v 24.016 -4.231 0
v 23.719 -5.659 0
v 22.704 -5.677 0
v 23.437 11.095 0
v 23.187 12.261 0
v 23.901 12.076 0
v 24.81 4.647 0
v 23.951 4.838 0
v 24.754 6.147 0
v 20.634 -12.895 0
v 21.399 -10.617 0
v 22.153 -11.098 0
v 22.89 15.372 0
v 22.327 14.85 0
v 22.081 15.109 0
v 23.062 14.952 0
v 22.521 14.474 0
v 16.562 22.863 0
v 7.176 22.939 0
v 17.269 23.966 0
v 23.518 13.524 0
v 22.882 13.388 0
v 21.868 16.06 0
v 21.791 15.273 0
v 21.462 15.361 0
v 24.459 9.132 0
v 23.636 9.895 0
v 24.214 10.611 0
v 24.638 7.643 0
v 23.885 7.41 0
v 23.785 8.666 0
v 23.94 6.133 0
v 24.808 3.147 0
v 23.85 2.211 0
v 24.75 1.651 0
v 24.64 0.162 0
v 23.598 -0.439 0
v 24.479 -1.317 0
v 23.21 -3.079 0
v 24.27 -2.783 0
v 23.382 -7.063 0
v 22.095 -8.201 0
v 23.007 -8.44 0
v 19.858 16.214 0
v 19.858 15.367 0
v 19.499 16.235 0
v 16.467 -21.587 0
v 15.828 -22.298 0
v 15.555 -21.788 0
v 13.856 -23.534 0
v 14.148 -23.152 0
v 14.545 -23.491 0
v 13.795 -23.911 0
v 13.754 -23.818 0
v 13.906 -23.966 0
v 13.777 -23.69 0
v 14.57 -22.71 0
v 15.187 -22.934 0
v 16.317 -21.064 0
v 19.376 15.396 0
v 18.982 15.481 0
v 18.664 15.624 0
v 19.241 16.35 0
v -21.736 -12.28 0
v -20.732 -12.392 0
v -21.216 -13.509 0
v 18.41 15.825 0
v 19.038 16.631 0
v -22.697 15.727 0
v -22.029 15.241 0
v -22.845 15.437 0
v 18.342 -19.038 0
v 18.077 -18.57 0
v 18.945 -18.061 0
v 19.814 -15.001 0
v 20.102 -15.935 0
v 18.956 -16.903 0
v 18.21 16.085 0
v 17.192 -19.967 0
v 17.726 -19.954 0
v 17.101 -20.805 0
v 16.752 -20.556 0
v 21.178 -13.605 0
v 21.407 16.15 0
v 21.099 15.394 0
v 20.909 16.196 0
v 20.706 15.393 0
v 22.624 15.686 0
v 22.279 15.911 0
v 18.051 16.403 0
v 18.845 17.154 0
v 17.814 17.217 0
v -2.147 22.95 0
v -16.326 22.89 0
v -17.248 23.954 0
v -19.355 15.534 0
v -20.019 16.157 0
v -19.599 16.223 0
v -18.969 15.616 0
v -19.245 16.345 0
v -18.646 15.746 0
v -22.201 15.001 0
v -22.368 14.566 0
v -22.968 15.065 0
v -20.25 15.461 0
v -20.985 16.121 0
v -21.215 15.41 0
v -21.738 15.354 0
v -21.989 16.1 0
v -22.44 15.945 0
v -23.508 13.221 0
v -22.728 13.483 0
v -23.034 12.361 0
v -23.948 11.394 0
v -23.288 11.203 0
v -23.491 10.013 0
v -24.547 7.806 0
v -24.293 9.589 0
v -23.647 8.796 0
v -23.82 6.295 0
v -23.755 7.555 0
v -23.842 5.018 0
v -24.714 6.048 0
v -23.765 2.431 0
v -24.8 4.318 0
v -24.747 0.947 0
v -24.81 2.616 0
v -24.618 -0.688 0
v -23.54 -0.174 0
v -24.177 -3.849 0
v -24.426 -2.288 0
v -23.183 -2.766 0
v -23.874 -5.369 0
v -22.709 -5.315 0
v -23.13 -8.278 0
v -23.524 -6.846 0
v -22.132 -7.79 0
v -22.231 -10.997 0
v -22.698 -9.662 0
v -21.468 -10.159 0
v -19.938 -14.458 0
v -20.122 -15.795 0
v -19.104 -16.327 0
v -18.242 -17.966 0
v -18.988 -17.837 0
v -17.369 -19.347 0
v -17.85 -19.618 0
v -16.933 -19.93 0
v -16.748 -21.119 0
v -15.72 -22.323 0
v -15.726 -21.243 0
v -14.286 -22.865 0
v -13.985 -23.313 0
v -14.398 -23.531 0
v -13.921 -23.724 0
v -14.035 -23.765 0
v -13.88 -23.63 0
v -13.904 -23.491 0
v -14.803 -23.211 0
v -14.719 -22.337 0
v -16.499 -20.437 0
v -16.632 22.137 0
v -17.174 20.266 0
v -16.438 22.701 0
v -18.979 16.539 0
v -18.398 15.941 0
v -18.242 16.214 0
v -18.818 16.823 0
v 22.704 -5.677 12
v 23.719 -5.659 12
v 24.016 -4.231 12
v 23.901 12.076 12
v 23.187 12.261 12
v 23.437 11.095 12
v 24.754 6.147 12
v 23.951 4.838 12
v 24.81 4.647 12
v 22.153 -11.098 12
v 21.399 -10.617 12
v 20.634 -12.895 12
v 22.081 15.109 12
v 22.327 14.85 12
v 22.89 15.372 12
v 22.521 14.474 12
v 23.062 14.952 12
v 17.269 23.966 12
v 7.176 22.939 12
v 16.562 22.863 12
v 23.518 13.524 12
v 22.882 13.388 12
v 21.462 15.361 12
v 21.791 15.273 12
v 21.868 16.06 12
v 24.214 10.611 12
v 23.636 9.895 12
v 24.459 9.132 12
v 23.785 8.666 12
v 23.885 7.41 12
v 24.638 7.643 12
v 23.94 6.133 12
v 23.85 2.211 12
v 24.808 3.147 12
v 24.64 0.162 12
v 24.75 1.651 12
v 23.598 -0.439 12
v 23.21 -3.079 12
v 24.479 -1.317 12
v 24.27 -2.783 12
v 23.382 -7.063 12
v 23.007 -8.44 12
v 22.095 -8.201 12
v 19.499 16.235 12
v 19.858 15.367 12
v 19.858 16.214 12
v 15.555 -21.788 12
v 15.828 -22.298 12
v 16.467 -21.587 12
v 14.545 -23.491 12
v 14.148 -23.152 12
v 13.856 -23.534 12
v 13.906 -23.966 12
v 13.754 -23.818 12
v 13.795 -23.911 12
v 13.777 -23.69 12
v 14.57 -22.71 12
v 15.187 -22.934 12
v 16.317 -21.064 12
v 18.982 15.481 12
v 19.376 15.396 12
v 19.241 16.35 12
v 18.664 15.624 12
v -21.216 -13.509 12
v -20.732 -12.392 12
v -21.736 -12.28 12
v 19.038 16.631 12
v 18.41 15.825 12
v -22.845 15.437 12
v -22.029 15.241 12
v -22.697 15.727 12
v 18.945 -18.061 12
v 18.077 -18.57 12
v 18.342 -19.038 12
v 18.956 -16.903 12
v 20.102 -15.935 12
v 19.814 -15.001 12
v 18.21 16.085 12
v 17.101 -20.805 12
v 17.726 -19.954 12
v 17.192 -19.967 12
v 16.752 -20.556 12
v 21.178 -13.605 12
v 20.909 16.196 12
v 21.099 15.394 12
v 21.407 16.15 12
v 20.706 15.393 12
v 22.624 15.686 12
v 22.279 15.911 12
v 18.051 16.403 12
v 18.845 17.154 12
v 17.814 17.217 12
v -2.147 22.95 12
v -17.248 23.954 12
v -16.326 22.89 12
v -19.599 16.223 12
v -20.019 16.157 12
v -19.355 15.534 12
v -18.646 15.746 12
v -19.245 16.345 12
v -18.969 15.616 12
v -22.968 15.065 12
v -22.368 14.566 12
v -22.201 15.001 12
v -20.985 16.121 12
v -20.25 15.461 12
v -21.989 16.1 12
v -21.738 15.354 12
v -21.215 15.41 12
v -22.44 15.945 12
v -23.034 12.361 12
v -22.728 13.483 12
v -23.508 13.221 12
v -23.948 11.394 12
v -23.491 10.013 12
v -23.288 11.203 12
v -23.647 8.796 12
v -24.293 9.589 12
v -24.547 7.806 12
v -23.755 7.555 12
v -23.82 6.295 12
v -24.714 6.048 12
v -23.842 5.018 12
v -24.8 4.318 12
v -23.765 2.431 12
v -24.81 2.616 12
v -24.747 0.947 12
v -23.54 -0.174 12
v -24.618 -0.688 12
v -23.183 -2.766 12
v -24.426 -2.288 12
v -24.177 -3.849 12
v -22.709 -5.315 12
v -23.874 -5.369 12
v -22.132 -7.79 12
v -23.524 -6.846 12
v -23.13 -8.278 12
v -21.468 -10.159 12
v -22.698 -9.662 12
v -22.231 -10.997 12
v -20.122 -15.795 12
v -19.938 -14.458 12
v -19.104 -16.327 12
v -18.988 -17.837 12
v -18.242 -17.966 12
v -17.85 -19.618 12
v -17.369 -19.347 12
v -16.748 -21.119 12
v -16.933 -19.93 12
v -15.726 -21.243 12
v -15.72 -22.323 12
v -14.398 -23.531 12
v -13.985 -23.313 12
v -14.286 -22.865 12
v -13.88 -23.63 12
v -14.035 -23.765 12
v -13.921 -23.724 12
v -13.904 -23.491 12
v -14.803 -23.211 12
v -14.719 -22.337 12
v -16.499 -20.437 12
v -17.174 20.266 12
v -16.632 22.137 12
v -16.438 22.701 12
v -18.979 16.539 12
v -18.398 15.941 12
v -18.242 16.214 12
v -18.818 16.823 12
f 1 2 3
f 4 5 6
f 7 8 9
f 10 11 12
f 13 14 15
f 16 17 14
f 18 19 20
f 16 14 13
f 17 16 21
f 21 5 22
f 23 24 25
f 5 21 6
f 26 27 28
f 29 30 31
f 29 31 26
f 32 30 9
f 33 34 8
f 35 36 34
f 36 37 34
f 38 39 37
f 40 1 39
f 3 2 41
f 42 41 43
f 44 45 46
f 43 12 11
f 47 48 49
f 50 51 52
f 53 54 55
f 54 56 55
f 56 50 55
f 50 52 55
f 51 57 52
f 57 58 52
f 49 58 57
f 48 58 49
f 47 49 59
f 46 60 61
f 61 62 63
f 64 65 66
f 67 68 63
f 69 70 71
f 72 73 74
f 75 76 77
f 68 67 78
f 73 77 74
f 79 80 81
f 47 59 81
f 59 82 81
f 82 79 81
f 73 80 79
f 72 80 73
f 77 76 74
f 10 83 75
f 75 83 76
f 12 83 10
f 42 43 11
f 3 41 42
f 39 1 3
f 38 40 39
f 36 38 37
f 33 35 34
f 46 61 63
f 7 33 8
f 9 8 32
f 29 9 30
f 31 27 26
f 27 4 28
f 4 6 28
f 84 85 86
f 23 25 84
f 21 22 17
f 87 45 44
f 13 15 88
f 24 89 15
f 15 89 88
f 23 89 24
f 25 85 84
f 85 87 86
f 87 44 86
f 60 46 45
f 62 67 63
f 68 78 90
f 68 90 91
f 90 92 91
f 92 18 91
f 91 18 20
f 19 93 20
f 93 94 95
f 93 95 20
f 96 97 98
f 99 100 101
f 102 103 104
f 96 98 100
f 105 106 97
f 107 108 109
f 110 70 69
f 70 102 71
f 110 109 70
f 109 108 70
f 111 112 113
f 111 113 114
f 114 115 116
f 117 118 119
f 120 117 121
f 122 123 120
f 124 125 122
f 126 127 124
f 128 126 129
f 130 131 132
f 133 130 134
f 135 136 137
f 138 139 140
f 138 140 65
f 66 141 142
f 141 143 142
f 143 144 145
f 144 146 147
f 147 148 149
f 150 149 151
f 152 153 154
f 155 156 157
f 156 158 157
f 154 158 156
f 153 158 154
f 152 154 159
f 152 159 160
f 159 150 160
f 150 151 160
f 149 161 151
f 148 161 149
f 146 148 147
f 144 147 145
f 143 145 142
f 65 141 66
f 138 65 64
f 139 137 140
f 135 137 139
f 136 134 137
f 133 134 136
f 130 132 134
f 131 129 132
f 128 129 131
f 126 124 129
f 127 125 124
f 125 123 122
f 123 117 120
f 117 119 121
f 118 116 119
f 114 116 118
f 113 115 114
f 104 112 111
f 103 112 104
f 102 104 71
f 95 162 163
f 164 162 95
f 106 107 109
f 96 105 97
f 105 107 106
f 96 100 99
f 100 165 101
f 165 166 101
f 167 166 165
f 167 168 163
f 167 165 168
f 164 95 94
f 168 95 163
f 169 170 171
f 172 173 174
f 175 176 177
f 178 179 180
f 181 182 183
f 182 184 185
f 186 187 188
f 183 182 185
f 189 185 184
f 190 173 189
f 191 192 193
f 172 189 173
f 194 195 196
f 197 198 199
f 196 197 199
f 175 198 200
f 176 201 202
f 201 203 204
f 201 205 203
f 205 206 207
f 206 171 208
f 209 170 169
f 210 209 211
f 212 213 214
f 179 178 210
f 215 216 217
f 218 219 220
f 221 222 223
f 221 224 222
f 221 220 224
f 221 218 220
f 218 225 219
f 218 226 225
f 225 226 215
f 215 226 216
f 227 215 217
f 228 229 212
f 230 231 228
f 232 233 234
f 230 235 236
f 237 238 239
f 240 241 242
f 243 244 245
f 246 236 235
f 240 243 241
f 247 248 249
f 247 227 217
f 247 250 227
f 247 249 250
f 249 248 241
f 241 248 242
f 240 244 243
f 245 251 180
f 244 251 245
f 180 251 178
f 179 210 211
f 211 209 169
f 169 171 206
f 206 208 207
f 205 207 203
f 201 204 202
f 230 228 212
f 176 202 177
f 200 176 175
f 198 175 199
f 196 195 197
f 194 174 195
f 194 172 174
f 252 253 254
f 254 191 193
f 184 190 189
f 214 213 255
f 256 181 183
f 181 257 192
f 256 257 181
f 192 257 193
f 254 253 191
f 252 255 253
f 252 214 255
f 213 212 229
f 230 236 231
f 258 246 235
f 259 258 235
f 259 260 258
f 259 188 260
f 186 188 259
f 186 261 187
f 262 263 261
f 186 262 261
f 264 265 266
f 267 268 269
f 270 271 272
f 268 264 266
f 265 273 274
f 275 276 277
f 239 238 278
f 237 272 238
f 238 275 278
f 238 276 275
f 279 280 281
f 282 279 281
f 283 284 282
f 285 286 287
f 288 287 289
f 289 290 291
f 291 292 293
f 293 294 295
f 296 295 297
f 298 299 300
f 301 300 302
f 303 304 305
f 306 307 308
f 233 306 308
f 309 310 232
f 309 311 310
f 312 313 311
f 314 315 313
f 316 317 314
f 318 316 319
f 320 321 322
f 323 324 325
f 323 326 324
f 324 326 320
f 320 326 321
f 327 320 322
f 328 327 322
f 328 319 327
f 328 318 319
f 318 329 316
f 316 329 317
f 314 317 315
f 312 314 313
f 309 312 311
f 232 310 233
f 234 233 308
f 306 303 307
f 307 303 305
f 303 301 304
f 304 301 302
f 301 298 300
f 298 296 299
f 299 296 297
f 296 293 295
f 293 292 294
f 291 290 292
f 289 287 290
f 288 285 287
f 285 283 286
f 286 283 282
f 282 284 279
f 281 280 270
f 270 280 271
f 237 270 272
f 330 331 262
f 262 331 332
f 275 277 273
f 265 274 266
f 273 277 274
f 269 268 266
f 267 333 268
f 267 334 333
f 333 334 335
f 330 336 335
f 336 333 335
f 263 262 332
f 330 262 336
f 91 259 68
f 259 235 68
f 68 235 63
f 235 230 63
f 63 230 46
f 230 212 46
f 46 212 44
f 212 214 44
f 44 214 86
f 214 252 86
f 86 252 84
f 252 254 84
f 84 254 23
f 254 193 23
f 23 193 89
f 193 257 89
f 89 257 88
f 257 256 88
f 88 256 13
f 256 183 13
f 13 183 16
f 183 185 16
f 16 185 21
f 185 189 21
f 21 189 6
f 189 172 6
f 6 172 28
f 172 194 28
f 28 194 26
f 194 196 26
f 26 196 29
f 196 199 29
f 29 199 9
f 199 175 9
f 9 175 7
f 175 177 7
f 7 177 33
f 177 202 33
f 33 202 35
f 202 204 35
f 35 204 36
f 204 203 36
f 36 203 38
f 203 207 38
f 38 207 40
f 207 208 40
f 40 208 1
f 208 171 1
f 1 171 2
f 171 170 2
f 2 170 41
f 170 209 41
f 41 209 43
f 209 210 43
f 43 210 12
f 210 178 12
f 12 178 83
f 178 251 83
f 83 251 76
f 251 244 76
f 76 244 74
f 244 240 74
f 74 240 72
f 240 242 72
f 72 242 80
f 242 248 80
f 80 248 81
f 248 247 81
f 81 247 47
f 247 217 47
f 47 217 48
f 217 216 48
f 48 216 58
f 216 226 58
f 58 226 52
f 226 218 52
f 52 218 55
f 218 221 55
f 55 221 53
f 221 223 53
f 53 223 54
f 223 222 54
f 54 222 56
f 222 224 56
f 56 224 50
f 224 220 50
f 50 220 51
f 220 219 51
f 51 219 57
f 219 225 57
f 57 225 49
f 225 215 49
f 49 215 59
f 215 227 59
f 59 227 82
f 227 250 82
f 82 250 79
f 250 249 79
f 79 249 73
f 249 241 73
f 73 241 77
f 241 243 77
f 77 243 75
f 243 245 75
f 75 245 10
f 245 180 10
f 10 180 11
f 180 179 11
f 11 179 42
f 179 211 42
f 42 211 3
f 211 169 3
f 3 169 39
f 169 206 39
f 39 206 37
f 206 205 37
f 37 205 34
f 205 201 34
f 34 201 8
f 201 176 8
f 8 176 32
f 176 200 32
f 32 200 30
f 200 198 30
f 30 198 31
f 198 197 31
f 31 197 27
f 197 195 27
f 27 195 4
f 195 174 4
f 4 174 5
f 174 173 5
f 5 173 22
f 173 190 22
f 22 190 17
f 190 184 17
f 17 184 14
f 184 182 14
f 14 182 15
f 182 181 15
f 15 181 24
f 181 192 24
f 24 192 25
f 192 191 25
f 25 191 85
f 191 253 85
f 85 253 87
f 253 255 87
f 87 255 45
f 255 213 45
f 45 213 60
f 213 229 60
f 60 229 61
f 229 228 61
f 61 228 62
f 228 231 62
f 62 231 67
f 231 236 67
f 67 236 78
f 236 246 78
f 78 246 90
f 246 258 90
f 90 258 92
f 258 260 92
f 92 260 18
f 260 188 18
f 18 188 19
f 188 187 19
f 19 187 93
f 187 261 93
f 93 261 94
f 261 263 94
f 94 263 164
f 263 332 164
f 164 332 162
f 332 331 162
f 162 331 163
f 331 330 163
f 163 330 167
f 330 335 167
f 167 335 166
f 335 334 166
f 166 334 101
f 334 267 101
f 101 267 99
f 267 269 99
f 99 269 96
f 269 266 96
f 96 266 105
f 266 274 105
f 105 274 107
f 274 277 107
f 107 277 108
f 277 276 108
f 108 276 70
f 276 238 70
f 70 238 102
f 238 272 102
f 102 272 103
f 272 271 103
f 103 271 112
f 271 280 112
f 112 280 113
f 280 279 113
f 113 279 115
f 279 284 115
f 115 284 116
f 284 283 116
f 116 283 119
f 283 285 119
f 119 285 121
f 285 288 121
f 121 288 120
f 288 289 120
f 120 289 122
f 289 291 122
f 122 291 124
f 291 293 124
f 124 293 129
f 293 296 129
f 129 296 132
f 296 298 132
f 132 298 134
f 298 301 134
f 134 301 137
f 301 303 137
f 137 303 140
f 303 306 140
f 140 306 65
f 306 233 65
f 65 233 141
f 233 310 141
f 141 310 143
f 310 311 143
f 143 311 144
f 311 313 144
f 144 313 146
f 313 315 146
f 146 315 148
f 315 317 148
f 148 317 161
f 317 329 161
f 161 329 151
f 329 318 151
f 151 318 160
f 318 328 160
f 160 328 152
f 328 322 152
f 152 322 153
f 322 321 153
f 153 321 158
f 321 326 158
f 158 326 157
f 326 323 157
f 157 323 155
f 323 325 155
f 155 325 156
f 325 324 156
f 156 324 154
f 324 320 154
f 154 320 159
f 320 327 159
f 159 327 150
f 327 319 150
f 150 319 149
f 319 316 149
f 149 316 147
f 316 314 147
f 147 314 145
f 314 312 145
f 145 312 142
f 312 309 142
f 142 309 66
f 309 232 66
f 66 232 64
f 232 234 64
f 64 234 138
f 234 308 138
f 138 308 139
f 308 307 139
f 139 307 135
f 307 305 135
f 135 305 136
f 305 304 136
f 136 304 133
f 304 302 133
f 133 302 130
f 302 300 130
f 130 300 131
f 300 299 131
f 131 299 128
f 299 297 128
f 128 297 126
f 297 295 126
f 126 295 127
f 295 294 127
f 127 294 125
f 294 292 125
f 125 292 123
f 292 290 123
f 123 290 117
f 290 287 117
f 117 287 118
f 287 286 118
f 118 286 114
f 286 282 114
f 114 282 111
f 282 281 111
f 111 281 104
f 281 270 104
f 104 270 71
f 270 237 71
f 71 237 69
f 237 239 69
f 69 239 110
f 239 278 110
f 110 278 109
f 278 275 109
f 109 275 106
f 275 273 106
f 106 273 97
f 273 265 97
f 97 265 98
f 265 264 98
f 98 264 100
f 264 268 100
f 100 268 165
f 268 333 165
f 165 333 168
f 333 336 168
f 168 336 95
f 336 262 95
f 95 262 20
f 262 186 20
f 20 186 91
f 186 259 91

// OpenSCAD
// Module names are of the form poly_<inkscape-path-id>().  As a result,
// you can associate a polygon in this OpenSCAD program with the corresponding
// SVG element in the Inkscape document by looking for the XML element with
// the attribute id="inkscape-path-id".

// fudge value is used to ensure that subtracted solids are a tad taller
// in the z dimension than the polygon being subtracted from.  This helps
// keep the resulting .stl file manifold.
fudge = 0.1;

module poly_path389047(h)
{
  scale([25.4/90, -25.4/90, 1]) union()
  {
    linear_extrude(height=h)
      polygon([[-75.169879,-54.601862],[-77.026060,-54.403178],[-78.056050,-54.002857],[-78.665041,-53.154719],[-79.258223,-51.612581],[-80.533036,-47.774466],[-81.616639,-43.797286],[-82.515736,-39.694705],[-83.237030,-35.480385],[-83.787225,-31.167990],[-84.173024,-26.771183],[-84.401132,-22.303629],[-84.478252,-17.778989],[-84.206343,-8.613109],[-83.410926,0.617151],[-82.145631,9.802483],[-80.464086,18.833581],[-78.419922,27.601138],[-76.066768,35.995847],[-73.458252,43.908401],[-70.648005,51.229493],[-67.689656,57.849817],[-64.636834,63.660066],[-61.543168,68.550933],[-59.997778,70.617440],[-58.462288,72.413112],[-55.723249,75.269740],[-52.153279,79.147150],[-50.619828,81.018910],[-49.554403,82.606178],[-49.267591,83.236911],[-49.182256,83.729061],[-49.326554,84.060140],[-49.728641,84.207662],[-51.014857,83.376802],[-52.450103,82.242580],[-55.700409,79.095874],[-59.345006,74.831205],[-63.249339,69.512231],[-67.278851,63.202610],[-71.298989,55.966004],[-75.175197,47.866069],[-77.017279,43.512248],[-78.772921,38.966467],[-80.425302,34.236683],[-81.957604,29.330855],[-83.353007,24.256939],[-84.594692,19.022893],[-85.665839,13.636675],[-86.549630,8.106241],[-87.229244,2.439549],[-87.687863,-3.355444],[-87.908666,-9.270779],[-87.874835,-15.298501],[-87.569551,-21.430650],[-86.975993,-27.659271],[-86.077342,-33.976405],[-84.856780,-40.374096],[-83.297486,-46.844385],[-81.382641,-53.379315],[-80.945288,-54.697491],[-80.422084,-55.726305],[-79.511803,-56.498401],[-77.913219,-57.046425],[-74.355064,-57.121940],[-70.933112,-57.249314],[-69.443544,-57.484736],[-68.192424,-57.915868],[-67.247887,-58.603624],[-66.678063,-59.608919],[-61.116620,-84.876931],[61.189279,-84.920331],[66.773349,-60.783431],[67.456500,-58.929965],[68.176709,-57.932383],[69.092547,-57.527117],[70.362589,-57.450598],[74.085398,-57.386370],[75.851158,-57.225384],[77.486262,-56.906752],[78.940543,-56.376673],[80.163832,-55.581349],[81.105960,-54.466980],[81.716759,-52.979765],[83.332559,-47.921028],[84.689794,-42.789604],[85.797354,-37.597597],[86.664131,-32.357109],[87.299015,-27.080244],[87.710896,-21.779106],[87.908666,-16.465796],[87.901216,-11.152420],[87.697435,-5.851080],[87.306215,-0.573879],[86.736446,4.667080],[85.997020,9.859693],[85.096827,14.991857],[84.044757,20.051468],[82.849702,25.026425],[81.520552,29.904622],[78.495532,39.322327],[75.040821,48.207758],[71.227547,56.464089],[67.126835,63.994494],[64.990916,67.457216],[62.809811,70.702147],[60.592409,73.717183],[58.347601,76.490221],[56.084278,79.009159],[53.811332,81.261892],[51.537651,83.236317],[49.272129,84.920332],[48.878370,84.724412],[48.735832,84.392794],[48.817188,83.941792],[49.095116,83.387720],[50.131389,82.035621],[51.626055,80.467012],[55.116193,77.202308],[57.816779,74.637712],[59.357785,72.834633],[60.915340,70.750771],[64.051439,65.797986],[67.167757,59.893944],[70.206978,53.153233],[73.111783,45.690438],[75.824853,37.620149],[78.288871,29.056950],[80.446520,20.115430],[82.240480,10.910175],[83.613435,1.555773],[84.508065,-7.833189],[84.867053,-17.142124],[84.827770,-21.730774],[84.633082,-26.256446],[84.275824,-30.704818],[83.748833,-35.061567],[83.044942,-39.312369],[82.156988,-43.442900],[81.077805,-47.438837],[79.800229,-51.285857],[79.109782,-52.616387],[78.241293,-53.535597],[77.213888,-54.115585],[76.046696,-54.428449],[74.758843,-54.546285],[73.369456,-54.541191],[70.362589,-54.450598],[68.655908,-54.551364],[67.258939,-54.854607],[66.131294,-55.361750],[65.232584,-56.074214],[64.522420,-56.993420],[63.960413,-58.120791],[63.119319,-61.005710],[58.684819,-81.010655],[25.428264,-81.281448],[-7.607213,-81.320164],[-57.847625,-81.105495],[-58.246205,-80.436165],[-58.933404,-78.438367],[-60.853647,-71.807145],[-64.637411,-57.450598],[-65.191186,-56.482364],[-66.067606,-55.793001],[-67.214319,-55.330524],[-68.578970,-55.042944],[-71.752671,-54.784530],[-75.169879,-54.601862]]);
  }
}

poly_path389047(12);
